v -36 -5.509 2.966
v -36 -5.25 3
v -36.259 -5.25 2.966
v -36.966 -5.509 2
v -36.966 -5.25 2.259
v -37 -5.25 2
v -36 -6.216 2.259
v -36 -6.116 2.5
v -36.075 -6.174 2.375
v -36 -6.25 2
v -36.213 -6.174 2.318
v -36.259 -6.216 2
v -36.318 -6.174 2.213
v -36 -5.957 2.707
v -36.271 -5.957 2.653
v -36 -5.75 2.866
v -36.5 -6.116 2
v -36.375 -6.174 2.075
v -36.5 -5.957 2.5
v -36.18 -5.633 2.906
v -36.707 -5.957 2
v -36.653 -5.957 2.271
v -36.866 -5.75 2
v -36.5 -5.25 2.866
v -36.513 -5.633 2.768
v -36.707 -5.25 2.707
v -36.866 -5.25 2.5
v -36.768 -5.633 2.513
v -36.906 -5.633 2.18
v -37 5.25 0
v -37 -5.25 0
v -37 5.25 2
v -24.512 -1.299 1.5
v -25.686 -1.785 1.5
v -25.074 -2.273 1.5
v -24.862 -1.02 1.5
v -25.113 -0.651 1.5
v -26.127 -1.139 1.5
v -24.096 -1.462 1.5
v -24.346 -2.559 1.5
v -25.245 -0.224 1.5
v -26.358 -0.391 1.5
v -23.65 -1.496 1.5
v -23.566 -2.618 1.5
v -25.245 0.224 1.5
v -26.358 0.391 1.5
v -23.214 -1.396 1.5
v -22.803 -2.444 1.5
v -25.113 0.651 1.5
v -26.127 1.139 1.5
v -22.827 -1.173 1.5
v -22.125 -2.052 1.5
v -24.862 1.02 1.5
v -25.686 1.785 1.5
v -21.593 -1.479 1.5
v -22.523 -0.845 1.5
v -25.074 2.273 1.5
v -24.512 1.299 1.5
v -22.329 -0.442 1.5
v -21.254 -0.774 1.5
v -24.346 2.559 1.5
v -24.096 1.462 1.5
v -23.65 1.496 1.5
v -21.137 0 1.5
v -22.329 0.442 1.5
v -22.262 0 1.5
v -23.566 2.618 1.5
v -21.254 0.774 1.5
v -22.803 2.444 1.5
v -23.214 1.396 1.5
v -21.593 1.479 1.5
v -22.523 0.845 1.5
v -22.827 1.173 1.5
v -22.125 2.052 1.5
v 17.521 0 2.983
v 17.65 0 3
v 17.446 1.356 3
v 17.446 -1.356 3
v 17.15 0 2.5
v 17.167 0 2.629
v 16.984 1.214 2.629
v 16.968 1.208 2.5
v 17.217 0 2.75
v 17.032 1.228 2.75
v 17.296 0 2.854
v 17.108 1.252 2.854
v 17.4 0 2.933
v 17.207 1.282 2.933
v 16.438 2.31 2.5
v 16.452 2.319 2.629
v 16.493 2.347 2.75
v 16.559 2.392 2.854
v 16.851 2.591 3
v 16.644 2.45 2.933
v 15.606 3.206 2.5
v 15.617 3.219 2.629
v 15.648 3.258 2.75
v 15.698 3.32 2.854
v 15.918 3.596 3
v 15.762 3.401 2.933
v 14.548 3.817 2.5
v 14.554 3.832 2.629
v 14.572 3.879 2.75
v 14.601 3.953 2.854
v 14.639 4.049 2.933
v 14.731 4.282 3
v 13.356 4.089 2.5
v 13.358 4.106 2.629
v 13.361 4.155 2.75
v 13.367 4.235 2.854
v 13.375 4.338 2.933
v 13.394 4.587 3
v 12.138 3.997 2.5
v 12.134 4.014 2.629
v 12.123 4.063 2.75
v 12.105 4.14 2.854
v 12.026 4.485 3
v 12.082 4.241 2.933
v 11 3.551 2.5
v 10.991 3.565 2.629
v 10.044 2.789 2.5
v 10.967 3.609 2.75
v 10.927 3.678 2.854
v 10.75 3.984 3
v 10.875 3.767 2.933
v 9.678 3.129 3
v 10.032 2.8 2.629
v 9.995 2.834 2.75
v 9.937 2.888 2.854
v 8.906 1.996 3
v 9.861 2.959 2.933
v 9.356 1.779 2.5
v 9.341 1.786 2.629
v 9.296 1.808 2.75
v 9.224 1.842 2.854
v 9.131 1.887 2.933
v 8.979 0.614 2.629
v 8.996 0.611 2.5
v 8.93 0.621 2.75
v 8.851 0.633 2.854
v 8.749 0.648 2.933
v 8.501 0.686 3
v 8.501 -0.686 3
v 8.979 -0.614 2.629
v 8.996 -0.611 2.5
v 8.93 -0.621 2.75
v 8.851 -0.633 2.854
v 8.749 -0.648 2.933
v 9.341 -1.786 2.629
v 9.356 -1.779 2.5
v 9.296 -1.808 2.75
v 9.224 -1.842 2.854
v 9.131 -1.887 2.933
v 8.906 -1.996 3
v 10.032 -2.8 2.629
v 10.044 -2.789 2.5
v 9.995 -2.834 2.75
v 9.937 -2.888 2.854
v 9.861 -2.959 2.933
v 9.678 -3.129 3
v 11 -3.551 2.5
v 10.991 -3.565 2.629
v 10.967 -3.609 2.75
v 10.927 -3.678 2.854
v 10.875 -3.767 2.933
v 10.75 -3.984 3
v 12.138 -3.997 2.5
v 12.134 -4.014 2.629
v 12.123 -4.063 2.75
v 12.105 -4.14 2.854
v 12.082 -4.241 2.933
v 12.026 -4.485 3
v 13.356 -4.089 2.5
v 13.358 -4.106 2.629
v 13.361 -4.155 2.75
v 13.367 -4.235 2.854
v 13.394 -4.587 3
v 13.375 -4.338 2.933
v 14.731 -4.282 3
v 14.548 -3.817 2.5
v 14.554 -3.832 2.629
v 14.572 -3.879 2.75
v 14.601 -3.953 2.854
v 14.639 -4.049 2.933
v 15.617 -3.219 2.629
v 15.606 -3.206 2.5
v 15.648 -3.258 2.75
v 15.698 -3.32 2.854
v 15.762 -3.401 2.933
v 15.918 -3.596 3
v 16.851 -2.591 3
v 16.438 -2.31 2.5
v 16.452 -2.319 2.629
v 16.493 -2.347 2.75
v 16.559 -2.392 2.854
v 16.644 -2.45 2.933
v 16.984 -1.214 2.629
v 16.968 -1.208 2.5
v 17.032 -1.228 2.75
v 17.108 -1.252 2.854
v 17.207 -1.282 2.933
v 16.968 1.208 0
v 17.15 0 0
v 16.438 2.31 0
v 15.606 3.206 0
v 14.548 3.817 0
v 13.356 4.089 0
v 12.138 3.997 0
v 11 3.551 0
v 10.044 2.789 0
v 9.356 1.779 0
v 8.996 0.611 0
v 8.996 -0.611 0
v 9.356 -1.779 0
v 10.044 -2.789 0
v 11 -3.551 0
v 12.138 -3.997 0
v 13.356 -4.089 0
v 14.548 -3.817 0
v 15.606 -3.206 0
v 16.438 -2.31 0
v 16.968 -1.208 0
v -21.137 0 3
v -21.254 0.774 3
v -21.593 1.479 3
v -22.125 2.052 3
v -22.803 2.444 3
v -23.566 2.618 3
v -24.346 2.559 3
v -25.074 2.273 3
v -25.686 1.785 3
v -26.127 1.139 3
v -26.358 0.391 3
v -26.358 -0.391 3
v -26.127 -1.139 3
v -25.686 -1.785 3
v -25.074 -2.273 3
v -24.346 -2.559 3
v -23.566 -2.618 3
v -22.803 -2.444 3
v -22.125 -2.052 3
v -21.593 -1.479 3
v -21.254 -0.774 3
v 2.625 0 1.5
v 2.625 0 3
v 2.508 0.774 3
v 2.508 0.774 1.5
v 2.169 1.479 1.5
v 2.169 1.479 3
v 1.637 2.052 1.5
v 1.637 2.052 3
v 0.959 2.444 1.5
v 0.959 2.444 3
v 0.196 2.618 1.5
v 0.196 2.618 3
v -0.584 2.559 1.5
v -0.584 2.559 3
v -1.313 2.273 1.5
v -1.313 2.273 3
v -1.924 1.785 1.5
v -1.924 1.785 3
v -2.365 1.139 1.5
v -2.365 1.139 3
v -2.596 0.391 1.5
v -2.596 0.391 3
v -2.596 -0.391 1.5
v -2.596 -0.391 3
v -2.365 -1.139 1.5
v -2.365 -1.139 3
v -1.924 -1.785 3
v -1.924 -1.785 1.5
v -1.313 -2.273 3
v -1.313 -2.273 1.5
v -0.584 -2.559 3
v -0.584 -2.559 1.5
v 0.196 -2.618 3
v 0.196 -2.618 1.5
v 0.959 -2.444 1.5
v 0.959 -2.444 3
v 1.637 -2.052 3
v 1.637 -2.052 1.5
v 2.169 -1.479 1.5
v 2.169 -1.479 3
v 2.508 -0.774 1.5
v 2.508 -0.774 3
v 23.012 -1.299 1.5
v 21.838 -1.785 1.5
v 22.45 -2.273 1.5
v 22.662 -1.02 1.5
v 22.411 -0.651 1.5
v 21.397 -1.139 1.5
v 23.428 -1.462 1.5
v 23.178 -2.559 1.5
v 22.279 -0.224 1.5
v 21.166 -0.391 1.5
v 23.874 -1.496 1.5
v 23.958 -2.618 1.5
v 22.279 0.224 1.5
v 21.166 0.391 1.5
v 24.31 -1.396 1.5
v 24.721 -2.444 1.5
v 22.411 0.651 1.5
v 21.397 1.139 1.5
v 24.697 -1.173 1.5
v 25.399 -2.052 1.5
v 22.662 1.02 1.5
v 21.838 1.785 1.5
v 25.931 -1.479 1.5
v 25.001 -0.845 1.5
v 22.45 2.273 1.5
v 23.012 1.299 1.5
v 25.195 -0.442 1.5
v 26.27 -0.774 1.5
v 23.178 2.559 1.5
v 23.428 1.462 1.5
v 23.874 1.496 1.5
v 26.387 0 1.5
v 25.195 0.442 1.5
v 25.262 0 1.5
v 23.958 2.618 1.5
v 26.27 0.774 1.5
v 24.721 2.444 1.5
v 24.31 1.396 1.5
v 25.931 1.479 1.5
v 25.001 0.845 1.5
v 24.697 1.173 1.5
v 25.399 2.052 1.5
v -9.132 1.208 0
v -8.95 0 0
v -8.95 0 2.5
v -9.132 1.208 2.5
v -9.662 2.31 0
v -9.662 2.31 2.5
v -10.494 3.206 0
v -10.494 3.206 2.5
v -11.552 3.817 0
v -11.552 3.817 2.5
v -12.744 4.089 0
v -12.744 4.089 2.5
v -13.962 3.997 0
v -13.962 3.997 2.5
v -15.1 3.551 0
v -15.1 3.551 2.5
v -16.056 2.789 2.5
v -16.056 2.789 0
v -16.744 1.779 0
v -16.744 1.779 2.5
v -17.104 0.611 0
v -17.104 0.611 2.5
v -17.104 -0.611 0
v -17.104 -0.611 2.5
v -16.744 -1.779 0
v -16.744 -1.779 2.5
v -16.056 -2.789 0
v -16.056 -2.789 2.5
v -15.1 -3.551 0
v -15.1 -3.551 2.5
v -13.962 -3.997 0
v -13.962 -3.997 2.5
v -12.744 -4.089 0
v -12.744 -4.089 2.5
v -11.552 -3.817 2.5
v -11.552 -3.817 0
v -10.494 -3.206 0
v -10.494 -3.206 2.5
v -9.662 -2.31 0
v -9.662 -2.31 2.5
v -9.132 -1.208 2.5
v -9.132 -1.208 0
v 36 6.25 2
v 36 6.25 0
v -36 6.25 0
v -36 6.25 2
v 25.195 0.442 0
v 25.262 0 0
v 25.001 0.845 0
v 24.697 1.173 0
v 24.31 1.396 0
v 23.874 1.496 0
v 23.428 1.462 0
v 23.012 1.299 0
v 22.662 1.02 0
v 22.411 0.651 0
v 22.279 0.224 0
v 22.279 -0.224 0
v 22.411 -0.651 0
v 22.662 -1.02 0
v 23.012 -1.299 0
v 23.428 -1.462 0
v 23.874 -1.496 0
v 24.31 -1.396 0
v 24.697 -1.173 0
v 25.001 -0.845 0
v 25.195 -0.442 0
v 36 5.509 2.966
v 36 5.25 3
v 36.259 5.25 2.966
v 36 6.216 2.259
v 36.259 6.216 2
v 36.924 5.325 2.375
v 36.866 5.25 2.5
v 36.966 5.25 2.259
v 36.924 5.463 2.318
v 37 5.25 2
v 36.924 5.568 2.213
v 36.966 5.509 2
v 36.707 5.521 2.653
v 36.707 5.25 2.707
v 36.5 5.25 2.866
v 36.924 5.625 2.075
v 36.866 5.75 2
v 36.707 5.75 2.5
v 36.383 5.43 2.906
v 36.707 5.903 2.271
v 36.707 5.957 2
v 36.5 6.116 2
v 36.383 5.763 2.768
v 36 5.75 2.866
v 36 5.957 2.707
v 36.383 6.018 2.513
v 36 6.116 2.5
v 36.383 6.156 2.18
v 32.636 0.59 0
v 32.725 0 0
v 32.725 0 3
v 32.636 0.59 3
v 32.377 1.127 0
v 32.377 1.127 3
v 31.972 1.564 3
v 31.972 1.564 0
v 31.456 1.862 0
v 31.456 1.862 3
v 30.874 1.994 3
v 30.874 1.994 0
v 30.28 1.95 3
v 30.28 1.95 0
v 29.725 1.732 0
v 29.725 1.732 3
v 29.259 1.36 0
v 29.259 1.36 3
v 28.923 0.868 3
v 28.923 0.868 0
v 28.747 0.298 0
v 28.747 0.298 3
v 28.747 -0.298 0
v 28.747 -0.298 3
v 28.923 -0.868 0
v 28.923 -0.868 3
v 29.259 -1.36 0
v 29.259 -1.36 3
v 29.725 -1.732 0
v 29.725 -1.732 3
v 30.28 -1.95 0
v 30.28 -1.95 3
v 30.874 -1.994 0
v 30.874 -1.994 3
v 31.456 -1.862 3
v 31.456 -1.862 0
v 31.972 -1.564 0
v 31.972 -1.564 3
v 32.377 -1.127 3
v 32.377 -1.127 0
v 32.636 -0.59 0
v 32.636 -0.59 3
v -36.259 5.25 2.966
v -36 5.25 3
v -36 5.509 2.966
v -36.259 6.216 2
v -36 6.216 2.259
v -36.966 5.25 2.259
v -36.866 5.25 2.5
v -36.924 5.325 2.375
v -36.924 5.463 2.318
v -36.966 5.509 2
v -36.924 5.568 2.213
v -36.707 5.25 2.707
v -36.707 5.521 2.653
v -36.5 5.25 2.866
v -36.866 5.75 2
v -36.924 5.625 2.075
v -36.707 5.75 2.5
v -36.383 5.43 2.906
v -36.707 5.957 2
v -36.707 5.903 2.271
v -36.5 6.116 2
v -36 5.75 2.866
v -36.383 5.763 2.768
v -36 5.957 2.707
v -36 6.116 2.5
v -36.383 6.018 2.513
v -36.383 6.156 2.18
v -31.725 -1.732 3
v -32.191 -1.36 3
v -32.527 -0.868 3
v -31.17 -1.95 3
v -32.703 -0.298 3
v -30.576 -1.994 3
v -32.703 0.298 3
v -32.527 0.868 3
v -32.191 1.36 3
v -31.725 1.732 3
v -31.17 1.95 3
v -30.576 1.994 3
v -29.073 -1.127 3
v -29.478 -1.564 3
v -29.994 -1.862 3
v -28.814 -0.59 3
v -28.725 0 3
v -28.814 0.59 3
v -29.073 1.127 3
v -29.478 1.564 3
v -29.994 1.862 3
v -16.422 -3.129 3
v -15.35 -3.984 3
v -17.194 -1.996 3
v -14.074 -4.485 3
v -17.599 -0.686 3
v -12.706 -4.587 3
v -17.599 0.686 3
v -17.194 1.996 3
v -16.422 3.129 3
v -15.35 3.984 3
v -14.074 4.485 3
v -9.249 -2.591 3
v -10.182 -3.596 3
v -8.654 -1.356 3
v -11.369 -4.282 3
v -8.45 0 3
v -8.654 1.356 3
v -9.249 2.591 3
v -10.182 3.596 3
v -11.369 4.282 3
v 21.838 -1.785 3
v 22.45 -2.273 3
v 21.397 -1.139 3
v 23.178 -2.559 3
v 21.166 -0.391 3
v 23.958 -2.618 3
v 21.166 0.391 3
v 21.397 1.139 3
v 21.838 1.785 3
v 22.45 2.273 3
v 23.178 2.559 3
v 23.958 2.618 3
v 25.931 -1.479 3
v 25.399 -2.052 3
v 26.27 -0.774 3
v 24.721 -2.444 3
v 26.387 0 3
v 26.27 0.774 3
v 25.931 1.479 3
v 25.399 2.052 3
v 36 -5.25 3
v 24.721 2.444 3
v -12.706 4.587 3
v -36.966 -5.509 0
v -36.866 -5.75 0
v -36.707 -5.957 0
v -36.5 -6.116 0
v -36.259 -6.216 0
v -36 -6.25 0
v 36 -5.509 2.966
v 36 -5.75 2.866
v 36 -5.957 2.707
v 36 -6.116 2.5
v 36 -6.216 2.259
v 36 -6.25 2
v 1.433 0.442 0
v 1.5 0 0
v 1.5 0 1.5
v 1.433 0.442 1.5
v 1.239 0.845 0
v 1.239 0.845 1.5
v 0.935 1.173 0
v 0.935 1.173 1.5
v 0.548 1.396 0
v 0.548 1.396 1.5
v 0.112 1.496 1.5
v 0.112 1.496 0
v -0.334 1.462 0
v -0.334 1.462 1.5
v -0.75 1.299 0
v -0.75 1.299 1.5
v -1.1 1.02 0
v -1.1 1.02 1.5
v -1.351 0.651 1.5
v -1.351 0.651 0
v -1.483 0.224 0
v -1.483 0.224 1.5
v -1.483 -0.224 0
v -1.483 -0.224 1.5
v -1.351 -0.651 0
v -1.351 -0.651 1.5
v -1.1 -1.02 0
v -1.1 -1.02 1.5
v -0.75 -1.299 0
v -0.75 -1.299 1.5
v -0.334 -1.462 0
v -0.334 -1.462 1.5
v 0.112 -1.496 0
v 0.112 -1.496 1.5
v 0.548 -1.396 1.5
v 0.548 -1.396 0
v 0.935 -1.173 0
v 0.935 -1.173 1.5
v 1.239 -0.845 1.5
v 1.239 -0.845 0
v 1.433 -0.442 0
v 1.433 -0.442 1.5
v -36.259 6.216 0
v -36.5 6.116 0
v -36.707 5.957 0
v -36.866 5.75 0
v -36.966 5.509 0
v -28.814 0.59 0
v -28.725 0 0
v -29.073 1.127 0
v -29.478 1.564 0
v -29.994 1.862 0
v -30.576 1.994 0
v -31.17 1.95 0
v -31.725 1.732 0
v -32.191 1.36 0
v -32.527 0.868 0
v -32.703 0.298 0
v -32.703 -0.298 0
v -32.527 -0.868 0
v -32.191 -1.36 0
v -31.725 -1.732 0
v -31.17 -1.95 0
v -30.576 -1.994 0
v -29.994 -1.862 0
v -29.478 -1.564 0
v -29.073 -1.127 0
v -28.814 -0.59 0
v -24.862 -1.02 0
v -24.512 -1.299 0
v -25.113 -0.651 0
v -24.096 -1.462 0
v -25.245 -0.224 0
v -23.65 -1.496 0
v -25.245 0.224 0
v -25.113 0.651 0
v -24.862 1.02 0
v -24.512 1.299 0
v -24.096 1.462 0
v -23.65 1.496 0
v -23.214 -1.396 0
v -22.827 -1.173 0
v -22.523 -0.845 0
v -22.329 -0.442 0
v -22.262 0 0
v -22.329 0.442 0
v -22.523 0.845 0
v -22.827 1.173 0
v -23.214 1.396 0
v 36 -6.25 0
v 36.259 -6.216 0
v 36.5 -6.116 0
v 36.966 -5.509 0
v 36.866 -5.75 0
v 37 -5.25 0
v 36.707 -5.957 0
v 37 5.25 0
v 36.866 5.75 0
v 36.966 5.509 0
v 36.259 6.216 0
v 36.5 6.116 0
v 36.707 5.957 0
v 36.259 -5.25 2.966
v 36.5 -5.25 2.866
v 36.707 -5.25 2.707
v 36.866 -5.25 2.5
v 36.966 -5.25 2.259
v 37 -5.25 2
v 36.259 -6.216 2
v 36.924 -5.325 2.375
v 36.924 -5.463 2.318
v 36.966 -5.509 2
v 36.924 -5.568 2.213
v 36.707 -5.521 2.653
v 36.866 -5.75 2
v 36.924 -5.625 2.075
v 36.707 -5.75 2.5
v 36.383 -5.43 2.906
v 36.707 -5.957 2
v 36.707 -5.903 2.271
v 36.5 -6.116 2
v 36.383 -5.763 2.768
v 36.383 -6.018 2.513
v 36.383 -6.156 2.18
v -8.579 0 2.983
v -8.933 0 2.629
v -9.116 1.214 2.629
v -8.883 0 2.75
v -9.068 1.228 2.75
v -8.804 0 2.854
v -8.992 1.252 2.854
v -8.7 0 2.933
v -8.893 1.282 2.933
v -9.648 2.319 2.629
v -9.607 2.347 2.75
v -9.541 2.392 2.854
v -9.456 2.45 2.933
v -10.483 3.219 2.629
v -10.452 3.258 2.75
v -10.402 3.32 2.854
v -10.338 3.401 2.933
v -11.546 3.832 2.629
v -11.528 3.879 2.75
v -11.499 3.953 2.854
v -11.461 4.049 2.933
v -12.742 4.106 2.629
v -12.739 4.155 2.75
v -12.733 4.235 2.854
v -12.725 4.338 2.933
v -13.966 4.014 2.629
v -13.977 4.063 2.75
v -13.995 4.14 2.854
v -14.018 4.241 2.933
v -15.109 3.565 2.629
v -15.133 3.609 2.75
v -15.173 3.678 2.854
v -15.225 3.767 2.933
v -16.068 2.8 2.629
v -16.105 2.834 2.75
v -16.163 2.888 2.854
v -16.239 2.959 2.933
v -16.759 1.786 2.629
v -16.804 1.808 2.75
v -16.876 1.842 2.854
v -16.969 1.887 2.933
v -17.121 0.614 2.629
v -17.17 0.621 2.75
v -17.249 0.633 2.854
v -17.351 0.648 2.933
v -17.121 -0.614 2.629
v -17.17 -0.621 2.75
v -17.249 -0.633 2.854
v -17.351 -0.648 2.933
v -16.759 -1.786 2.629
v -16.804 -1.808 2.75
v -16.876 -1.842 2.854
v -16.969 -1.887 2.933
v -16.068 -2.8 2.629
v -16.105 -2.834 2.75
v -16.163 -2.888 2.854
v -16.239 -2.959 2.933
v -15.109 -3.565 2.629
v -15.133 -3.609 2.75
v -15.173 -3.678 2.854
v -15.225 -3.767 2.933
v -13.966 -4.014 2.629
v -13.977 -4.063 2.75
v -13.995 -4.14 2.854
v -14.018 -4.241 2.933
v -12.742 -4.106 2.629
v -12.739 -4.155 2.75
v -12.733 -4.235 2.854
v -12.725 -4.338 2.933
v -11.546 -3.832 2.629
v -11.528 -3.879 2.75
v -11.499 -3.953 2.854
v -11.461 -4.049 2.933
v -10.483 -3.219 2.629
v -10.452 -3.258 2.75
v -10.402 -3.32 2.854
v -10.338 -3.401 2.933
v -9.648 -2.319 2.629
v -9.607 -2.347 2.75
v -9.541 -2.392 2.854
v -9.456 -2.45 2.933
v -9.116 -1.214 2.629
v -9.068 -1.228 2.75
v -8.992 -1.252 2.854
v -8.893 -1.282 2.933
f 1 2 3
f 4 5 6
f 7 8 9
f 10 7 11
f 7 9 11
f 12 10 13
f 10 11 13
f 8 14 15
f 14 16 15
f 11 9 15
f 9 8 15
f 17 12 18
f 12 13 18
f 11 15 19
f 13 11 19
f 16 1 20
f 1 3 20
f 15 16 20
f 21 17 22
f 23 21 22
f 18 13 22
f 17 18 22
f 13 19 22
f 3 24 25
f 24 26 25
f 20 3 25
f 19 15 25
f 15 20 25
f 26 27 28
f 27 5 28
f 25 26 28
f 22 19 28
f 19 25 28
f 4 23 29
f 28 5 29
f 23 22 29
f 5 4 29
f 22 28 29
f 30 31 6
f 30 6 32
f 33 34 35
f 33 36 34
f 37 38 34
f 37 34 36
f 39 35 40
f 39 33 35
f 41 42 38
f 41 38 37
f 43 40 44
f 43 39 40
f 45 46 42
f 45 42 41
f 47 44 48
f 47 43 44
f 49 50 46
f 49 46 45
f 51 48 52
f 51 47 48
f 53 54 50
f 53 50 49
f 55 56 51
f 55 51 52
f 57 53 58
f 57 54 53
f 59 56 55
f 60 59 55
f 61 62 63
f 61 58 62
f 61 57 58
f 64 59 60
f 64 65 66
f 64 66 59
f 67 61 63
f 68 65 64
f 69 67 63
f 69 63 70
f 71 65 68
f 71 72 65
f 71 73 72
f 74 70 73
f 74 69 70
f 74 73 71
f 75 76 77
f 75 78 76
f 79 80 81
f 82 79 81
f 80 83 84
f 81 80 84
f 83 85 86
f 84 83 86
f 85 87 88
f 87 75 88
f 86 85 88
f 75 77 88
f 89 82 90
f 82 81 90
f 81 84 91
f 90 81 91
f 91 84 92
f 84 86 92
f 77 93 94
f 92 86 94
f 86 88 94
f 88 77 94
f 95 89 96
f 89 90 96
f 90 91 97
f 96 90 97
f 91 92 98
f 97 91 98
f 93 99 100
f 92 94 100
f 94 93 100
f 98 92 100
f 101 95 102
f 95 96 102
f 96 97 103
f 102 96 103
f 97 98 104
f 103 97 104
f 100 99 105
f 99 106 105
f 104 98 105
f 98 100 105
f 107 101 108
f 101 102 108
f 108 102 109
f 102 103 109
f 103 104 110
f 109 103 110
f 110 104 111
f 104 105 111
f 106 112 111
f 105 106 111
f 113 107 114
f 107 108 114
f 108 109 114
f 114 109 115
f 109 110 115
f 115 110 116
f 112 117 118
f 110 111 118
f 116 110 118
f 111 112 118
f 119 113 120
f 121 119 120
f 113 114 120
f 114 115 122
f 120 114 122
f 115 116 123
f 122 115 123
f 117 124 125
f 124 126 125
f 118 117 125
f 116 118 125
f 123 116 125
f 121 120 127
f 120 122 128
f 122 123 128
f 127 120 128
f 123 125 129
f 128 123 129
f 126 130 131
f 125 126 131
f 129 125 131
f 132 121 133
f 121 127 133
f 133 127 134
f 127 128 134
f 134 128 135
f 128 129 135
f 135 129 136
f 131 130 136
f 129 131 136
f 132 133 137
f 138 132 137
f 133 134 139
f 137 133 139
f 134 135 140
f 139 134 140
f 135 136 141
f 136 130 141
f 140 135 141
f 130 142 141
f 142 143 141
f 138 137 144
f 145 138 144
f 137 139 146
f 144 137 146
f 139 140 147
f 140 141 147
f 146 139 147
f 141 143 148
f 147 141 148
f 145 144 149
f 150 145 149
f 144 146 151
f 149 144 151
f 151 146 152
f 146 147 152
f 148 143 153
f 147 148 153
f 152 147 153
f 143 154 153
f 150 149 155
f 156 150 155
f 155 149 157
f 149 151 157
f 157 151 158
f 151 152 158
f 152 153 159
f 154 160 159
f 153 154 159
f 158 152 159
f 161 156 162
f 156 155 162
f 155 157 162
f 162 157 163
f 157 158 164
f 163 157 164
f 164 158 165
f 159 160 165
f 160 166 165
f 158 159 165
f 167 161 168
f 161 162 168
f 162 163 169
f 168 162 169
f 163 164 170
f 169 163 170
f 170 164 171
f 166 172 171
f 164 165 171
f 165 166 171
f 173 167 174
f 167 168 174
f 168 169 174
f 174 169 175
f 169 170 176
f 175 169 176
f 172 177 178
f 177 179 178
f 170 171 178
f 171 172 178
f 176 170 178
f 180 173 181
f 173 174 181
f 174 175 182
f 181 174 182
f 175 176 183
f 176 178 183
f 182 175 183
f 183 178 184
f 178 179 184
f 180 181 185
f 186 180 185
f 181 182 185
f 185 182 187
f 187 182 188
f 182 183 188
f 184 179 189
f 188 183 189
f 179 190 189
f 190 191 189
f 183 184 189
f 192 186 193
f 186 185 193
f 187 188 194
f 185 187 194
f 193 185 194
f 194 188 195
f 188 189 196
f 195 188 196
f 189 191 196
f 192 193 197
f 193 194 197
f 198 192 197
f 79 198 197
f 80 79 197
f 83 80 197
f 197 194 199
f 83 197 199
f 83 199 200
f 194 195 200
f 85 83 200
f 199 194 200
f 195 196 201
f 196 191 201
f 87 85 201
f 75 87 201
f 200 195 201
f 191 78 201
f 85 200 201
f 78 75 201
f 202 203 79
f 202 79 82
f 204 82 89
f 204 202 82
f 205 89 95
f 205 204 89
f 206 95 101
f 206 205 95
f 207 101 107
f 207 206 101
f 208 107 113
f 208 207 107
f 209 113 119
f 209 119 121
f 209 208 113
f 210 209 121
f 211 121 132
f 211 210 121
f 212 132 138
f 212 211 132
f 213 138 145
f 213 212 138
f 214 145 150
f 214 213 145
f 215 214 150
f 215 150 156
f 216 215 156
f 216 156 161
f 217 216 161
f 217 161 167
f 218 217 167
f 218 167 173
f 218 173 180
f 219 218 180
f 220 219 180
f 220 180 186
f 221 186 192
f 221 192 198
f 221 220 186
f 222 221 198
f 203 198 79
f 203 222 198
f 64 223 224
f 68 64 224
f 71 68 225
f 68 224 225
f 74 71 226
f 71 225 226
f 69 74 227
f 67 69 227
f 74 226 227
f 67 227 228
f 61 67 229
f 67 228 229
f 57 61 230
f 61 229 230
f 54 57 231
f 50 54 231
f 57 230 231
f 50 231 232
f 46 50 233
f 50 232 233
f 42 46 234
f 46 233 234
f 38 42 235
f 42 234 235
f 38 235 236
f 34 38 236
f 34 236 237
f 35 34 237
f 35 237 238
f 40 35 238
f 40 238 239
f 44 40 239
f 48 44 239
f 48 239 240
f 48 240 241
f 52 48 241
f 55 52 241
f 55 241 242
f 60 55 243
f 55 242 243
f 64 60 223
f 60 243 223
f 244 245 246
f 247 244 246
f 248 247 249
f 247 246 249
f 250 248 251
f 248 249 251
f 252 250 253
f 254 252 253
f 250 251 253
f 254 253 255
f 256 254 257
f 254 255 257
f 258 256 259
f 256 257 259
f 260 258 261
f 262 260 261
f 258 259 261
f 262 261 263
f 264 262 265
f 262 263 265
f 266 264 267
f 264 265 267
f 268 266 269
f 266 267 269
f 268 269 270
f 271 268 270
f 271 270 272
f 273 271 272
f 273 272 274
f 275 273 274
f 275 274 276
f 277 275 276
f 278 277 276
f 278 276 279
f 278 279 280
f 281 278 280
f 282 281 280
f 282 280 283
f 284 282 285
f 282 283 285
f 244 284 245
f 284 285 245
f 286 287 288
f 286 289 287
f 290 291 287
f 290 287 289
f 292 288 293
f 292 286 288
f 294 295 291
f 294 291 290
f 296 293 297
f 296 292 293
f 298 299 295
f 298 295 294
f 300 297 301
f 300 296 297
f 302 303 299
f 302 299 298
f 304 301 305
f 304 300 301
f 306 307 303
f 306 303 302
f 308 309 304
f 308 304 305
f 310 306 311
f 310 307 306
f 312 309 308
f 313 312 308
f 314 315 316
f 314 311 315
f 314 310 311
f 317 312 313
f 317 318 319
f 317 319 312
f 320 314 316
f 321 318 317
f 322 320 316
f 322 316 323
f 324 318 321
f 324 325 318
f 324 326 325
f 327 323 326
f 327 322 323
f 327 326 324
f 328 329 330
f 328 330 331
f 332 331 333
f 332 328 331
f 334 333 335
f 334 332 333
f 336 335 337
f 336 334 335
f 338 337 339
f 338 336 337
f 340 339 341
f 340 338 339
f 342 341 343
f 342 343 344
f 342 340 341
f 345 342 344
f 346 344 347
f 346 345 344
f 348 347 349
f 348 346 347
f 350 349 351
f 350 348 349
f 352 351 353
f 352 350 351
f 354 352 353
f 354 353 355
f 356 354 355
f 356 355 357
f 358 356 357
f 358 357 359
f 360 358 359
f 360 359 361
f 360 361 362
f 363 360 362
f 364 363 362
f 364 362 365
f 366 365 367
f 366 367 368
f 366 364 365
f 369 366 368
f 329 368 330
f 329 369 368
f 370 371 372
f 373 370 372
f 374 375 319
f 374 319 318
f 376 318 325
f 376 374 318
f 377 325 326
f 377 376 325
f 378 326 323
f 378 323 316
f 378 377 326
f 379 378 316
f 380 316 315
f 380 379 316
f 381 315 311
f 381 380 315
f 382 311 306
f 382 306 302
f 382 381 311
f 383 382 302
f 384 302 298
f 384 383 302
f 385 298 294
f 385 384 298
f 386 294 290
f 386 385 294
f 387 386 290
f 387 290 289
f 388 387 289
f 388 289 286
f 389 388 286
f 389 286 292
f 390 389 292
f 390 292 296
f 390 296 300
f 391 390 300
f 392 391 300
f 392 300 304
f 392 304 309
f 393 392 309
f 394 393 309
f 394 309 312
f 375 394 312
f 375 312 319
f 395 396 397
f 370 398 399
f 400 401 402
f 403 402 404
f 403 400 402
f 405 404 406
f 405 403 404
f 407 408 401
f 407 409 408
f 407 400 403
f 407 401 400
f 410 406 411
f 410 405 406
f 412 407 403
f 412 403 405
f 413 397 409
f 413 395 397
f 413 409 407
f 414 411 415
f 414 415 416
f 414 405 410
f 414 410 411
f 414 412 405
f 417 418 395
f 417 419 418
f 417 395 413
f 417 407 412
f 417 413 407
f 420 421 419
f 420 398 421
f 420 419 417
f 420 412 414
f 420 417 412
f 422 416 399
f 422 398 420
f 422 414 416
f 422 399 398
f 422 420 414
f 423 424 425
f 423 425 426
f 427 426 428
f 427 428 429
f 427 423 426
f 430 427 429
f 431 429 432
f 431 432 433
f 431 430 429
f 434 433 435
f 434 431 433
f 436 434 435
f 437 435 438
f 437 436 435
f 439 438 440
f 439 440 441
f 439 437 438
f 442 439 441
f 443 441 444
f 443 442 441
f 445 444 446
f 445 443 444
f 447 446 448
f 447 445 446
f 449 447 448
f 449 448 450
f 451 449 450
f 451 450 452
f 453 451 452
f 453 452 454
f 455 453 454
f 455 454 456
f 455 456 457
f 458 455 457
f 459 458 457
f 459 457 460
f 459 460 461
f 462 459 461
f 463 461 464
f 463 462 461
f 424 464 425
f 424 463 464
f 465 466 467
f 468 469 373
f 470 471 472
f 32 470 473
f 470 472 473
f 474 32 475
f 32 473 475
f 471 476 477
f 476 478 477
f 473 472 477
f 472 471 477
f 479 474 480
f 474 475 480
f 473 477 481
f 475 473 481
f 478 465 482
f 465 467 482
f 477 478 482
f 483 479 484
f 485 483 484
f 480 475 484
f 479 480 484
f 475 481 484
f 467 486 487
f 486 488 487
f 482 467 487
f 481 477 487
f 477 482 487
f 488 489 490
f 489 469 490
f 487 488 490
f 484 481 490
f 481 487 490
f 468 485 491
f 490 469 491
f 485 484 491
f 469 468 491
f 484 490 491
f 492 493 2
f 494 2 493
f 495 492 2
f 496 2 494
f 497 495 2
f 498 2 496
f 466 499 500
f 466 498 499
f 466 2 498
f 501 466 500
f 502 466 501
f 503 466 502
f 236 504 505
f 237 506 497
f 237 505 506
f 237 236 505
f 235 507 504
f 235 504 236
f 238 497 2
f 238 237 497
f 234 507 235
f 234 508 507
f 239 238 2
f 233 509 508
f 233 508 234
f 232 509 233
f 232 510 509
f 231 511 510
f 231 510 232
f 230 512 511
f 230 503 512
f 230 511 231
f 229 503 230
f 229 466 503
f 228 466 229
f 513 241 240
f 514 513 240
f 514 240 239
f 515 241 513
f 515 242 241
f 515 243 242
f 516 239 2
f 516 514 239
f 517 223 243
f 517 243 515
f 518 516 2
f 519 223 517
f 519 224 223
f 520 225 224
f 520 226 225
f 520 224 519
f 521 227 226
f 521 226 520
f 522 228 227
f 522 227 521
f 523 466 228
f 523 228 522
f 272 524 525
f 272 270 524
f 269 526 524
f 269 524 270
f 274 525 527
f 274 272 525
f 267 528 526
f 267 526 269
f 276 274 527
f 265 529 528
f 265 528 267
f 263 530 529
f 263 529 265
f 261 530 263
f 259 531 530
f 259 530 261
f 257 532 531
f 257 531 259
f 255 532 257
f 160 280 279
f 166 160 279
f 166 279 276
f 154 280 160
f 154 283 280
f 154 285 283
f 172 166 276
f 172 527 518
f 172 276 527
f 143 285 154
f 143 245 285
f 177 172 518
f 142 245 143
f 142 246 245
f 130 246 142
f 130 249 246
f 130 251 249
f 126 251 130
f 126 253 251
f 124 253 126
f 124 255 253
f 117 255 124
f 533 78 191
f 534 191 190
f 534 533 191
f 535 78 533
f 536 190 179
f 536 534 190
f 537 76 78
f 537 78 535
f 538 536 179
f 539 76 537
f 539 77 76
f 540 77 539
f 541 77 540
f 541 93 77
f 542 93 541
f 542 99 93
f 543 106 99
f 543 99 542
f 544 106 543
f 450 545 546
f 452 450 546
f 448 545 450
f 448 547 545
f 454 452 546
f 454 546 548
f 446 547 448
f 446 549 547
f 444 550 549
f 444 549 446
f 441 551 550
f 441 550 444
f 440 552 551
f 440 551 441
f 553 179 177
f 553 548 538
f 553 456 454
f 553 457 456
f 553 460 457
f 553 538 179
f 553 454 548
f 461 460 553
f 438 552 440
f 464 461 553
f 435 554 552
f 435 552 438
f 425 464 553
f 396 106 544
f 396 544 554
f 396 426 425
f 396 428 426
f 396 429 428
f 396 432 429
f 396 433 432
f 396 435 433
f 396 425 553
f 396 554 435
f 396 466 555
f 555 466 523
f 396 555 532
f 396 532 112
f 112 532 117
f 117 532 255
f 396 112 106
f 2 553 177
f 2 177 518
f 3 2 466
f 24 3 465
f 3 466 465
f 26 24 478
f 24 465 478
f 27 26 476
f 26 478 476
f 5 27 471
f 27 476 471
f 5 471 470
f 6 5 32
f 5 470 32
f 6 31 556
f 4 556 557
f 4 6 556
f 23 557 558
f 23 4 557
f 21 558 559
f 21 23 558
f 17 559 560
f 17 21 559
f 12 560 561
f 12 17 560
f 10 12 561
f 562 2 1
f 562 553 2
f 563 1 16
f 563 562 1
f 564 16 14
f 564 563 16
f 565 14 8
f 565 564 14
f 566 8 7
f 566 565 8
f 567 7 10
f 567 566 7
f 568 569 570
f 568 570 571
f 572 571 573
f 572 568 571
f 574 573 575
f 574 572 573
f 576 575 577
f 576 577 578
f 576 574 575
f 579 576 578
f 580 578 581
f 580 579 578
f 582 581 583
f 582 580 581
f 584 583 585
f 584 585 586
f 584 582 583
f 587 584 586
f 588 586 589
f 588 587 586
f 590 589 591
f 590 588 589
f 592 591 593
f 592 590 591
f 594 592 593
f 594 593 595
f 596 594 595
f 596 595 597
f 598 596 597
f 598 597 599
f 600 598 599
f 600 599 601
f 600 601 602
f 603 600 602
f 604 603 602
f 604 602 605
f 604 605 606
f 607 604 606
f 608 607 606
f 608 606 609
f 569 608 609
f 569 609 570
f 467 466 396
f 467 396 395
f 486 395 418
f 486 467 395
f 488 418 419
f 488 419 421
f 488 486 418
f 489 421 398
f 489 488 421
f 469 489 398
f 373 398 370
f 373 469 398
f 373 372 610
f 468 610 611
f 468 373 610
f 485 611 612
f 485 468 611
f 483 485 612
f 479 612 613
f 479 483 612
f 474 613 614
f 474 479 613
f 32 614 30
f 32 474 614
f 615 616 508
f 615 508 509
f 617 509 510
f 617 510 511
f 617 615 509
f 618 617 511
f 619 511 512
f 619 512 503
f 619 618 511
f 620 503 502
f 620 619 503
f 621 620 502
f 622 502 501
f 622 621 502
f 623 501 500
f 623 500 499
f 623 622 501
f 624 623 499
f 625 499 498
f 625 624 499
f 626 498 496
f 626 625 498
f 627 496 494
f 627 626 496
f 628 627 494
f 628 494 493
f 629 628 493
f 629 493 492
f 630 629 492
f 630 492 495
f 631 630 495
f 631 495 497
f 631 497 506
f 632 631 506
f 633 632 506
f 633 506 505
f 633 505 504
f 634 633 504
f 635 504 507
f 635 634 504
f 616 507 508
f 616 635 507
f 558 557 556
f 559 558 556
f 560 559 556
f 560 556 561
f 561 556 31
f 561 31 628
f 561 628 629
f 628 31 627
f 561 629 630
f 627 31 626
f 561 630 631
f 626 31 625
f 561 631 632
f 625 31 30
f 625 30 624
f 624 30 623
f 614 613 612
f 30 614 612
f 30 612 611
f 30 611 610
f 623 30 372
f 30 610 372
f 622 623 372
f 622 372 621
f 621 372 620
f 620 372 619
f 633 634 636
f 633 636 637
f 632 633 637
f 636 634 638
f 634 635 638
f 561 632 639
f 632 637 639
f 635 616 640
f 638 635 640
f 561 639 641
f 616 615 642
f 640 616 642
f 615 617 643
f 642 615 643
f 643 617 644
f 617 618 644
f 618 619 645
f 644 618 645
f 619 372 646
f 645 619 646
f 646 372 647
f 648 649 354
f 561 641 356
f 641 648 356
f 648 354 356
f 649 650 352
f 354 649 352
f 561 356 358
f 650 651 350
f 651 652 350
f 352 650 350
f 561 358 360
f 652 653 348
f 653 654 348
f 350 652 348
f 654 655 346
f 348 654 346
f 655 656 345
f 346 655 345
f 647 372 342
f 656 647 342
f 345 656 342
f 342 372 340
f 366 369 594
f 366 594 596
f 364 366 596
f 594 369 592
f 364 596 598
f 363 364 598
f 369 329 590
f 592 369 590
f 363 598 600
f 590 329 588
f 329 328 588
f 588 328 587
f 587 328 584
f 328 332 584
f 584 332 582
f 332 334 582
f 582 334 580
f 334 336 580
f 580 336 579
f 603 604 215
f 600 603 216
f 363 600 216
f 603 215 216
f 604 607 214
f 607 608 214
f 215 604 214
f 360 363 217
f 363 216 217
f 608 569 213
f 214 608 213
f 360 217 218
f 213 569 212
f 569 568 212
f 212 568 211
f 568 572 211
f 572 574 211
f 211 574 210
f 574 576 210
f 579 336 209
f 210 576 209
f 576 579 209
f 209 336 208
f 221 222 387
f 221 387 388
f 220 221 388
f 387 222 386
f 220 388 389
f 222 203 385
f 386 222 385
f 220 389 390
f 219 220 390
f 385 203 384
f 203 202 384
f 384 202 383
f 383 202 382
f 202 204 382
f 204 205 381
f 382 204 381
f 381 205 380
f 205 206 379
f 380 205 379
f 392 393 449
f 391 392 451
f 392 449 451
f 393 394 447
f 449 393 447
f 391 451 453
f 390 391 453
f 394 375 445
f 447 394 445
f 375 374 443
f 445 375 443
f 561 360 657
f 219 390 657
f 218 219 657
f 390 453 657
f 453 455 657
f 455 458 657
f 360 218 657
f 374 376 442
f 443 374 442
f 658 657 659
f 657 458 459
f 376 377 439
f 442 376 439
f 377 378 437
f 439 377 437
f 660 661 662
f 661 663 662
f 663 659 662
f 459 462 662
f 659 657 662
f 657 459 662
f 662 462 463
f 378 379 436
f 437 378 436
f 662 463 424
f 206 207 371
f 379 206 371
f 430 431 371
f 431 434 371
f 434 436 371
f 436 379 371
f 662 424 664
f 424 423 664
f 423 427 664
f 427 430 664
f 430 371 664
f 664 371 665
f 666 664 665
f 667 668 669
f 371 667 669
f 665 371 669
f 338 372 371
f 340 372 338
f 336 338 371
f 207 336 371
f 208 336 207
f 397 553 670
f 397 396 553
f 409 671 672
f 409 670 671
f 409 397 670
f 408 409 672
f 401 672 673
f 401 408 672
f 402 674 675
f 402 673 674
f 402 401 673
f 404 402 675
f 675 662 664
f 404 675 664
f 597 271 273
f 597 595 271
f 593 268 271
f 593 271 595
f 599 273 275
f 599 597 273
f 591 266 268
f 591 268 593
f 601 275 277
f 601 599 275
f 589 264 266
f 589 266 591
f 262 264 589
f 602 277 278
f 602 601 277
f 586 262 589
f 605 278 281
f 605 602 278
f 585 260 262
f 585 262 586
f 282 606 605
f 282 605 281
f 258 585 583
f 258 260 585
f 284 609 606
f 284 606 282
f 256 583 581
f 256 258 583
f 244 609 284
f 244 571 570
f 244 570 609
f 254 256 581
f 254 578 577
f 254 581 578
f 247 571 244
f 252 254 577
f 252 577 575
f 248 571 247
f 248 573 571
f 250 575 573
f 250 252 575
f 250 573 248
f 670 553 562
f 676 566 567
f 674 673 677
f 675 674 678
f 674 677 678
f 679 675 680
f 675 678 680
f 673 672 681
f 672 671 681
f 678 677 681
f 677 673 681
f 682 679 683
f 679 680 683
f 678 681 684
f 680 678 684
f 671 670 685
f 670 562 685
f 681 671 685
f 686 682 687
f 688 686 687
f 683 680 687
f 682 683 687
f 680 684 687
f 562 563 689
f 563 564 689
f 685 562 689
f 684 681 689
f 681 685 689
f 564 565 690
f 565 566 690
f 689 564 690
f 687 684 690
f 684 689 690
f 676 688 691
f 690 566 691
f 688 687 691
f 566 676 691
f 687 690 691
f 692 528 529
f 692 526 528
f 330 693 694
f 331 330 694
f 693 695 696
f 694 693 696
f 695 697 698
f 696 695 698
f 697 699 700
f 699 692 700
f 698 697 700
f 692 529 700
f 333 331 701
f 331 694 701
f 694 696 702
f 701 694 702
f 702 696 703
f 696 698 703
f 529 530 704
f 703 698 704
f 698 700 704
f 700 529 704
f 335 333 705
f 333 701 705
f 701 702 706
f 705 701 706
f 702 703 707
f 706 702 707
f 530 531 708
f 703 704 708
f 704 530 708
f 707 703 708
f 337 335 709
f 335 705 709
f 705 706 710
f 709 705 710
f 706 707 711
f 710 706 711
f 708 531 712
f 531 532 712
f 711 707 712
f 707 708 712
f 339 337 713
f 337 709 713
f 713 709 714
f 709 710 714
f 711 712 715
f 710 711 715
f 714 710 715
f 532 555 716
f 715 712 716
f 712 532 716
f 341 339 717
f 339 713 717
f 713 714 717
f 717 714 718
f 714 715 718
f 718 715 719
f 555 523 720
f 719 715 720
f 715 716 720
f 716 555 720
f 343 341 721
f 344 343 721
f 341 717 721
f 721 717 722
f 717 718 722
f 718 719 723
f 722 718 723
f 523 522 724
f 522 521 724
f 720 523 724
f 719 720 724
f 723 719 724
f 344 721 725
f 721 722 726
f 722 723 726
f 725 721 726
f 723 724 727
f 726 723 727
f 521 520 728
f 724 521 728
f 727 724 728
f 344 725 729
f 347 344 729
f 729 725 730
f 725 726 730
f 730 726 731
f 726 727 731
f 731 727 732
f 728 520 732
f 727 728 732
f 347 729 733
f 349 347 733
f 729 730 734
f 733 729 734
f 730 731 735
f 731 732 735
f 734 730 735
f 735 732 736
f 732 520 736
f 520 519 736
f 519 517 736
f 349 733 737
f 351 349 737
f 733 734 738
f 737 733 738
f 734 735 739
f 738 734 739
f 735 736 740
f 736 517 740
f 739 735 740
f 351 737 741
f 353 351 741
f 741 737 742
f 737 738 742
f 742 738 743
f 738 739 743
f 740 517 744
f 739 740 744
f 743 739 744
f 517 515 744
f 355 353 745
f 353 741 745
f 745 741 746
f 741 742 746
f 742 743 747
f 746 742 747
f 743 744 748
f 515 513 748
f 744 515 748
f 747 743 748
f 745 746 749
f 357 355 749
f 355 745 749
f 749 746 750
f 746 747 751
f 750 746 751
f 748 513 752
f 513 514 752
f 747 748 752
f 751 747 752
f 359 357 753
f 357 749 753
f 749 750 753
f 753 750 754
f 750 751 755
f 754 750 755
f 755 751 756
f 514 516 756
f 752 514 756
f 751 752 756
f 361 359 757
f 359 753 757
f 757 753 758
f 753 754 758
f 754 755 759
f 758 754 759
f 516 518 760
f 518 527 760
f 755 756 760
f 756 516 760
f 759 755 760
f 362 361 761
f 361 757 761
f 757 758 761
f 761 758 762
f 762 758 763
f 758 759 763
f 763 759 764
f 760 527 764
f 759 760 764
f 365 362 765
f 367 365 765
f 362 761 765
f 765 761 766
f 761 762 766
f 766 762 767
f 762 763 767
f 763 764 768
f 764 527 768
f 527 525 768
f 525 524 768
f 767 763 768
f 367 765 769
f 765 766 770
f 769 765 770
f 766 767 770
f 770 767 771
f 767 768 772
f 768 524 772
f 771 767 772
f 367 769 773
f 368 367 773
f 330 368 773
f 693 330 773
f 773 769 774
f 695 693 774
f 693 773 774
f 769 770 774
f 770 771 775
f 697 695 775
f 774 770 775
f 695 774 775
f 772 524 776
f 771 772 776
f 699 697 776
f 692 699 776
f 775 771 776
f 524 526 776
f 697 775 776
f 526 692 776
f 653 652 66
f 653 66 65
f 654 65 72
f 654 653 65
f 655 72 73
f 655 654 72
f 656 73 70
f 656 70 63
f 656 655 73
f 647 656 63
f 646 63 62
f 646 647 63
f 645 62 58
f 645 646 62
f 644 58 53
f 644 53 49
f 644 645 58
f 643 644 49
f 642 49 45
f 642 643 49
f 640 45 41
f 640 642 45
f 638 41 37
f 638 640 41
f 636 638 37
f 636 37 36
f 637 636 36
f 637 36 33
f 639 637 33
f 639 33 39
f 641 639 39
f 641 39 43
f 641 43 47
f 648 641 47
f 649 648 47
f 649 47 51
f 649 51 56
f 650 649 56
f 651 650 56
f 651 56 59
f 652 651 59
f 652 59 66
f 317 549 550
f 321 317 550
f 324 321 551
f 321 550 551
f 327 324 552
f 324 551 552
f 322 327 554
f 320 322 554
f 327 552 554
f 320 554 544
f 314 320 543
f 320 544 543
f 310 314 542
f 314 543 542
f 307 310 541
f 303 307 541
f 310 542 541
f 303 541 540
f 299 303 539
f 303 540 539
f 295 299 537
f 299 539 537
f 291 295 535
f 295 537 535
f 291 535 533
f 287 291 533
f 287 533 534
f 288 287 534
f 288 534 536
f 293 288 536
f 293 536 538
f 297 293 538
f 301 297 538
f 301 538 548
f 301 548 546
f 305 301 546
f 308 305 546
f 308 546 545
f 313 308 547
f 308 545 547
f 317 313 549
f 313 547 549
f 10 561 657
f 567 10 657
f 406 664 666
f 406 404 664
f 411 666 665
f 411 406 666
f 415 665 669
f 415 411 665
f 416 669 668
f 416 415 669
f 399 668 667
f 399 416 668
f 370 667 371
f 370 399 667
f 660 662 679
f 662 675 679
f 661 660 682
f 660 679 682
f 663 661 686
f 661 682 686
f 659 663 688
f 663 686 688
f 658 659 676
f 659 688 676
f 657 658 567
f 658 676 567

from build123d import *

# Parameters (mm, degrees)
F0_W     = 70
F0_H     = 12.5
F0_R     = 2
F0_R_2   = 1.5
F0_R_3   = 4.1
F0_W_2   = 2
F1_DEPTH = 3
F2_R     = 0.5
F3_R     = 2.625
F3_R_2   = 1.5
F4_DEPTH = 1.5
F5_R     = 1


with BuildPart() as f1:
    # F0 (on Top) → F1 (new body)
    with BuildSketch(Plane.XY):
        Rectangle(F0_W, F0_H)
        with Locations((-30.725, 0)):
            Circle(F0_R, mode=Mode.SUBTRACT)
        with Locations((-23.762, 0)):
            Circle(F0_R_2, mode=Mode.SUBTRACT)
        with Locations((-13.05, 0)):
            Circle(F0_R_3, mode=Mode.SUBTRACT)
        Circle(F0_R_2, mode=Mode.SUBTRACT)
        with Locations((13.05, 0)):
            Circle(F0_R_3, mode=Mode.SUBTRACT)
        with Locations((23.762, 0)):
            Circle(F0_R_2, mode=Mode.SUBTRACT)
        with Locations((30.725, 0)):
            Circle(F0_R, mode=Mode.SUBTRACT)
        with Locations((36, 0)):
            Rectangle(F0_W_2, F0_H)
        with Locations((-36, 0)):
            Rectangle(F0_W_2, F0_H)
    extrude(amount=F1_DEPTH)

    # F2
    f2_edges = [f1.edges().sort_by_distance(p)[0] for p in [
        (-17.15, 0, 3),
        (8.95, 0, 3),
    ]]
    fillet(f2_edges, radius=F2_R)

    # F3 (on face) → F4 (cut)
    with BuildSketch(Plane.XY.offset(3)):
        with Locations((-23.762, 0)):
            Circle(F3_R)
        with Locations((-23.762, 0)):
            Circle(F3_R_2, mode=Mode.SUBTRACT)
        Circle(F3_R)
        Circle(F3_R_2, mode=Mode.SUBTRACT)
        with Locations((23.762, 0)):
            Circle(F3_R)
        with Locations((23.762, 0)):
            Circle(F3_R_2, mode=Mode.SUBTRACT)
    extrude(amount=-F4_DEPTH, mode=Mode.SUBTRACT)

    # F5
    f5_edges = [f1.edges().sort_by_distance(p)[0] for p in [
        (0, 6.25, 3),
        (-37, 0, 3),
        (0, -6.25, 3),
        (37, 0, 3),
        (-37, 6.25, 1.5),
        (-37, -6.25, 1.5),
        (37, 6.25, 1.5),
        (37, -6.25, 1.5),
    ]]
    fillet(f5_edges, radius=F5_R)


solid = f1.part
